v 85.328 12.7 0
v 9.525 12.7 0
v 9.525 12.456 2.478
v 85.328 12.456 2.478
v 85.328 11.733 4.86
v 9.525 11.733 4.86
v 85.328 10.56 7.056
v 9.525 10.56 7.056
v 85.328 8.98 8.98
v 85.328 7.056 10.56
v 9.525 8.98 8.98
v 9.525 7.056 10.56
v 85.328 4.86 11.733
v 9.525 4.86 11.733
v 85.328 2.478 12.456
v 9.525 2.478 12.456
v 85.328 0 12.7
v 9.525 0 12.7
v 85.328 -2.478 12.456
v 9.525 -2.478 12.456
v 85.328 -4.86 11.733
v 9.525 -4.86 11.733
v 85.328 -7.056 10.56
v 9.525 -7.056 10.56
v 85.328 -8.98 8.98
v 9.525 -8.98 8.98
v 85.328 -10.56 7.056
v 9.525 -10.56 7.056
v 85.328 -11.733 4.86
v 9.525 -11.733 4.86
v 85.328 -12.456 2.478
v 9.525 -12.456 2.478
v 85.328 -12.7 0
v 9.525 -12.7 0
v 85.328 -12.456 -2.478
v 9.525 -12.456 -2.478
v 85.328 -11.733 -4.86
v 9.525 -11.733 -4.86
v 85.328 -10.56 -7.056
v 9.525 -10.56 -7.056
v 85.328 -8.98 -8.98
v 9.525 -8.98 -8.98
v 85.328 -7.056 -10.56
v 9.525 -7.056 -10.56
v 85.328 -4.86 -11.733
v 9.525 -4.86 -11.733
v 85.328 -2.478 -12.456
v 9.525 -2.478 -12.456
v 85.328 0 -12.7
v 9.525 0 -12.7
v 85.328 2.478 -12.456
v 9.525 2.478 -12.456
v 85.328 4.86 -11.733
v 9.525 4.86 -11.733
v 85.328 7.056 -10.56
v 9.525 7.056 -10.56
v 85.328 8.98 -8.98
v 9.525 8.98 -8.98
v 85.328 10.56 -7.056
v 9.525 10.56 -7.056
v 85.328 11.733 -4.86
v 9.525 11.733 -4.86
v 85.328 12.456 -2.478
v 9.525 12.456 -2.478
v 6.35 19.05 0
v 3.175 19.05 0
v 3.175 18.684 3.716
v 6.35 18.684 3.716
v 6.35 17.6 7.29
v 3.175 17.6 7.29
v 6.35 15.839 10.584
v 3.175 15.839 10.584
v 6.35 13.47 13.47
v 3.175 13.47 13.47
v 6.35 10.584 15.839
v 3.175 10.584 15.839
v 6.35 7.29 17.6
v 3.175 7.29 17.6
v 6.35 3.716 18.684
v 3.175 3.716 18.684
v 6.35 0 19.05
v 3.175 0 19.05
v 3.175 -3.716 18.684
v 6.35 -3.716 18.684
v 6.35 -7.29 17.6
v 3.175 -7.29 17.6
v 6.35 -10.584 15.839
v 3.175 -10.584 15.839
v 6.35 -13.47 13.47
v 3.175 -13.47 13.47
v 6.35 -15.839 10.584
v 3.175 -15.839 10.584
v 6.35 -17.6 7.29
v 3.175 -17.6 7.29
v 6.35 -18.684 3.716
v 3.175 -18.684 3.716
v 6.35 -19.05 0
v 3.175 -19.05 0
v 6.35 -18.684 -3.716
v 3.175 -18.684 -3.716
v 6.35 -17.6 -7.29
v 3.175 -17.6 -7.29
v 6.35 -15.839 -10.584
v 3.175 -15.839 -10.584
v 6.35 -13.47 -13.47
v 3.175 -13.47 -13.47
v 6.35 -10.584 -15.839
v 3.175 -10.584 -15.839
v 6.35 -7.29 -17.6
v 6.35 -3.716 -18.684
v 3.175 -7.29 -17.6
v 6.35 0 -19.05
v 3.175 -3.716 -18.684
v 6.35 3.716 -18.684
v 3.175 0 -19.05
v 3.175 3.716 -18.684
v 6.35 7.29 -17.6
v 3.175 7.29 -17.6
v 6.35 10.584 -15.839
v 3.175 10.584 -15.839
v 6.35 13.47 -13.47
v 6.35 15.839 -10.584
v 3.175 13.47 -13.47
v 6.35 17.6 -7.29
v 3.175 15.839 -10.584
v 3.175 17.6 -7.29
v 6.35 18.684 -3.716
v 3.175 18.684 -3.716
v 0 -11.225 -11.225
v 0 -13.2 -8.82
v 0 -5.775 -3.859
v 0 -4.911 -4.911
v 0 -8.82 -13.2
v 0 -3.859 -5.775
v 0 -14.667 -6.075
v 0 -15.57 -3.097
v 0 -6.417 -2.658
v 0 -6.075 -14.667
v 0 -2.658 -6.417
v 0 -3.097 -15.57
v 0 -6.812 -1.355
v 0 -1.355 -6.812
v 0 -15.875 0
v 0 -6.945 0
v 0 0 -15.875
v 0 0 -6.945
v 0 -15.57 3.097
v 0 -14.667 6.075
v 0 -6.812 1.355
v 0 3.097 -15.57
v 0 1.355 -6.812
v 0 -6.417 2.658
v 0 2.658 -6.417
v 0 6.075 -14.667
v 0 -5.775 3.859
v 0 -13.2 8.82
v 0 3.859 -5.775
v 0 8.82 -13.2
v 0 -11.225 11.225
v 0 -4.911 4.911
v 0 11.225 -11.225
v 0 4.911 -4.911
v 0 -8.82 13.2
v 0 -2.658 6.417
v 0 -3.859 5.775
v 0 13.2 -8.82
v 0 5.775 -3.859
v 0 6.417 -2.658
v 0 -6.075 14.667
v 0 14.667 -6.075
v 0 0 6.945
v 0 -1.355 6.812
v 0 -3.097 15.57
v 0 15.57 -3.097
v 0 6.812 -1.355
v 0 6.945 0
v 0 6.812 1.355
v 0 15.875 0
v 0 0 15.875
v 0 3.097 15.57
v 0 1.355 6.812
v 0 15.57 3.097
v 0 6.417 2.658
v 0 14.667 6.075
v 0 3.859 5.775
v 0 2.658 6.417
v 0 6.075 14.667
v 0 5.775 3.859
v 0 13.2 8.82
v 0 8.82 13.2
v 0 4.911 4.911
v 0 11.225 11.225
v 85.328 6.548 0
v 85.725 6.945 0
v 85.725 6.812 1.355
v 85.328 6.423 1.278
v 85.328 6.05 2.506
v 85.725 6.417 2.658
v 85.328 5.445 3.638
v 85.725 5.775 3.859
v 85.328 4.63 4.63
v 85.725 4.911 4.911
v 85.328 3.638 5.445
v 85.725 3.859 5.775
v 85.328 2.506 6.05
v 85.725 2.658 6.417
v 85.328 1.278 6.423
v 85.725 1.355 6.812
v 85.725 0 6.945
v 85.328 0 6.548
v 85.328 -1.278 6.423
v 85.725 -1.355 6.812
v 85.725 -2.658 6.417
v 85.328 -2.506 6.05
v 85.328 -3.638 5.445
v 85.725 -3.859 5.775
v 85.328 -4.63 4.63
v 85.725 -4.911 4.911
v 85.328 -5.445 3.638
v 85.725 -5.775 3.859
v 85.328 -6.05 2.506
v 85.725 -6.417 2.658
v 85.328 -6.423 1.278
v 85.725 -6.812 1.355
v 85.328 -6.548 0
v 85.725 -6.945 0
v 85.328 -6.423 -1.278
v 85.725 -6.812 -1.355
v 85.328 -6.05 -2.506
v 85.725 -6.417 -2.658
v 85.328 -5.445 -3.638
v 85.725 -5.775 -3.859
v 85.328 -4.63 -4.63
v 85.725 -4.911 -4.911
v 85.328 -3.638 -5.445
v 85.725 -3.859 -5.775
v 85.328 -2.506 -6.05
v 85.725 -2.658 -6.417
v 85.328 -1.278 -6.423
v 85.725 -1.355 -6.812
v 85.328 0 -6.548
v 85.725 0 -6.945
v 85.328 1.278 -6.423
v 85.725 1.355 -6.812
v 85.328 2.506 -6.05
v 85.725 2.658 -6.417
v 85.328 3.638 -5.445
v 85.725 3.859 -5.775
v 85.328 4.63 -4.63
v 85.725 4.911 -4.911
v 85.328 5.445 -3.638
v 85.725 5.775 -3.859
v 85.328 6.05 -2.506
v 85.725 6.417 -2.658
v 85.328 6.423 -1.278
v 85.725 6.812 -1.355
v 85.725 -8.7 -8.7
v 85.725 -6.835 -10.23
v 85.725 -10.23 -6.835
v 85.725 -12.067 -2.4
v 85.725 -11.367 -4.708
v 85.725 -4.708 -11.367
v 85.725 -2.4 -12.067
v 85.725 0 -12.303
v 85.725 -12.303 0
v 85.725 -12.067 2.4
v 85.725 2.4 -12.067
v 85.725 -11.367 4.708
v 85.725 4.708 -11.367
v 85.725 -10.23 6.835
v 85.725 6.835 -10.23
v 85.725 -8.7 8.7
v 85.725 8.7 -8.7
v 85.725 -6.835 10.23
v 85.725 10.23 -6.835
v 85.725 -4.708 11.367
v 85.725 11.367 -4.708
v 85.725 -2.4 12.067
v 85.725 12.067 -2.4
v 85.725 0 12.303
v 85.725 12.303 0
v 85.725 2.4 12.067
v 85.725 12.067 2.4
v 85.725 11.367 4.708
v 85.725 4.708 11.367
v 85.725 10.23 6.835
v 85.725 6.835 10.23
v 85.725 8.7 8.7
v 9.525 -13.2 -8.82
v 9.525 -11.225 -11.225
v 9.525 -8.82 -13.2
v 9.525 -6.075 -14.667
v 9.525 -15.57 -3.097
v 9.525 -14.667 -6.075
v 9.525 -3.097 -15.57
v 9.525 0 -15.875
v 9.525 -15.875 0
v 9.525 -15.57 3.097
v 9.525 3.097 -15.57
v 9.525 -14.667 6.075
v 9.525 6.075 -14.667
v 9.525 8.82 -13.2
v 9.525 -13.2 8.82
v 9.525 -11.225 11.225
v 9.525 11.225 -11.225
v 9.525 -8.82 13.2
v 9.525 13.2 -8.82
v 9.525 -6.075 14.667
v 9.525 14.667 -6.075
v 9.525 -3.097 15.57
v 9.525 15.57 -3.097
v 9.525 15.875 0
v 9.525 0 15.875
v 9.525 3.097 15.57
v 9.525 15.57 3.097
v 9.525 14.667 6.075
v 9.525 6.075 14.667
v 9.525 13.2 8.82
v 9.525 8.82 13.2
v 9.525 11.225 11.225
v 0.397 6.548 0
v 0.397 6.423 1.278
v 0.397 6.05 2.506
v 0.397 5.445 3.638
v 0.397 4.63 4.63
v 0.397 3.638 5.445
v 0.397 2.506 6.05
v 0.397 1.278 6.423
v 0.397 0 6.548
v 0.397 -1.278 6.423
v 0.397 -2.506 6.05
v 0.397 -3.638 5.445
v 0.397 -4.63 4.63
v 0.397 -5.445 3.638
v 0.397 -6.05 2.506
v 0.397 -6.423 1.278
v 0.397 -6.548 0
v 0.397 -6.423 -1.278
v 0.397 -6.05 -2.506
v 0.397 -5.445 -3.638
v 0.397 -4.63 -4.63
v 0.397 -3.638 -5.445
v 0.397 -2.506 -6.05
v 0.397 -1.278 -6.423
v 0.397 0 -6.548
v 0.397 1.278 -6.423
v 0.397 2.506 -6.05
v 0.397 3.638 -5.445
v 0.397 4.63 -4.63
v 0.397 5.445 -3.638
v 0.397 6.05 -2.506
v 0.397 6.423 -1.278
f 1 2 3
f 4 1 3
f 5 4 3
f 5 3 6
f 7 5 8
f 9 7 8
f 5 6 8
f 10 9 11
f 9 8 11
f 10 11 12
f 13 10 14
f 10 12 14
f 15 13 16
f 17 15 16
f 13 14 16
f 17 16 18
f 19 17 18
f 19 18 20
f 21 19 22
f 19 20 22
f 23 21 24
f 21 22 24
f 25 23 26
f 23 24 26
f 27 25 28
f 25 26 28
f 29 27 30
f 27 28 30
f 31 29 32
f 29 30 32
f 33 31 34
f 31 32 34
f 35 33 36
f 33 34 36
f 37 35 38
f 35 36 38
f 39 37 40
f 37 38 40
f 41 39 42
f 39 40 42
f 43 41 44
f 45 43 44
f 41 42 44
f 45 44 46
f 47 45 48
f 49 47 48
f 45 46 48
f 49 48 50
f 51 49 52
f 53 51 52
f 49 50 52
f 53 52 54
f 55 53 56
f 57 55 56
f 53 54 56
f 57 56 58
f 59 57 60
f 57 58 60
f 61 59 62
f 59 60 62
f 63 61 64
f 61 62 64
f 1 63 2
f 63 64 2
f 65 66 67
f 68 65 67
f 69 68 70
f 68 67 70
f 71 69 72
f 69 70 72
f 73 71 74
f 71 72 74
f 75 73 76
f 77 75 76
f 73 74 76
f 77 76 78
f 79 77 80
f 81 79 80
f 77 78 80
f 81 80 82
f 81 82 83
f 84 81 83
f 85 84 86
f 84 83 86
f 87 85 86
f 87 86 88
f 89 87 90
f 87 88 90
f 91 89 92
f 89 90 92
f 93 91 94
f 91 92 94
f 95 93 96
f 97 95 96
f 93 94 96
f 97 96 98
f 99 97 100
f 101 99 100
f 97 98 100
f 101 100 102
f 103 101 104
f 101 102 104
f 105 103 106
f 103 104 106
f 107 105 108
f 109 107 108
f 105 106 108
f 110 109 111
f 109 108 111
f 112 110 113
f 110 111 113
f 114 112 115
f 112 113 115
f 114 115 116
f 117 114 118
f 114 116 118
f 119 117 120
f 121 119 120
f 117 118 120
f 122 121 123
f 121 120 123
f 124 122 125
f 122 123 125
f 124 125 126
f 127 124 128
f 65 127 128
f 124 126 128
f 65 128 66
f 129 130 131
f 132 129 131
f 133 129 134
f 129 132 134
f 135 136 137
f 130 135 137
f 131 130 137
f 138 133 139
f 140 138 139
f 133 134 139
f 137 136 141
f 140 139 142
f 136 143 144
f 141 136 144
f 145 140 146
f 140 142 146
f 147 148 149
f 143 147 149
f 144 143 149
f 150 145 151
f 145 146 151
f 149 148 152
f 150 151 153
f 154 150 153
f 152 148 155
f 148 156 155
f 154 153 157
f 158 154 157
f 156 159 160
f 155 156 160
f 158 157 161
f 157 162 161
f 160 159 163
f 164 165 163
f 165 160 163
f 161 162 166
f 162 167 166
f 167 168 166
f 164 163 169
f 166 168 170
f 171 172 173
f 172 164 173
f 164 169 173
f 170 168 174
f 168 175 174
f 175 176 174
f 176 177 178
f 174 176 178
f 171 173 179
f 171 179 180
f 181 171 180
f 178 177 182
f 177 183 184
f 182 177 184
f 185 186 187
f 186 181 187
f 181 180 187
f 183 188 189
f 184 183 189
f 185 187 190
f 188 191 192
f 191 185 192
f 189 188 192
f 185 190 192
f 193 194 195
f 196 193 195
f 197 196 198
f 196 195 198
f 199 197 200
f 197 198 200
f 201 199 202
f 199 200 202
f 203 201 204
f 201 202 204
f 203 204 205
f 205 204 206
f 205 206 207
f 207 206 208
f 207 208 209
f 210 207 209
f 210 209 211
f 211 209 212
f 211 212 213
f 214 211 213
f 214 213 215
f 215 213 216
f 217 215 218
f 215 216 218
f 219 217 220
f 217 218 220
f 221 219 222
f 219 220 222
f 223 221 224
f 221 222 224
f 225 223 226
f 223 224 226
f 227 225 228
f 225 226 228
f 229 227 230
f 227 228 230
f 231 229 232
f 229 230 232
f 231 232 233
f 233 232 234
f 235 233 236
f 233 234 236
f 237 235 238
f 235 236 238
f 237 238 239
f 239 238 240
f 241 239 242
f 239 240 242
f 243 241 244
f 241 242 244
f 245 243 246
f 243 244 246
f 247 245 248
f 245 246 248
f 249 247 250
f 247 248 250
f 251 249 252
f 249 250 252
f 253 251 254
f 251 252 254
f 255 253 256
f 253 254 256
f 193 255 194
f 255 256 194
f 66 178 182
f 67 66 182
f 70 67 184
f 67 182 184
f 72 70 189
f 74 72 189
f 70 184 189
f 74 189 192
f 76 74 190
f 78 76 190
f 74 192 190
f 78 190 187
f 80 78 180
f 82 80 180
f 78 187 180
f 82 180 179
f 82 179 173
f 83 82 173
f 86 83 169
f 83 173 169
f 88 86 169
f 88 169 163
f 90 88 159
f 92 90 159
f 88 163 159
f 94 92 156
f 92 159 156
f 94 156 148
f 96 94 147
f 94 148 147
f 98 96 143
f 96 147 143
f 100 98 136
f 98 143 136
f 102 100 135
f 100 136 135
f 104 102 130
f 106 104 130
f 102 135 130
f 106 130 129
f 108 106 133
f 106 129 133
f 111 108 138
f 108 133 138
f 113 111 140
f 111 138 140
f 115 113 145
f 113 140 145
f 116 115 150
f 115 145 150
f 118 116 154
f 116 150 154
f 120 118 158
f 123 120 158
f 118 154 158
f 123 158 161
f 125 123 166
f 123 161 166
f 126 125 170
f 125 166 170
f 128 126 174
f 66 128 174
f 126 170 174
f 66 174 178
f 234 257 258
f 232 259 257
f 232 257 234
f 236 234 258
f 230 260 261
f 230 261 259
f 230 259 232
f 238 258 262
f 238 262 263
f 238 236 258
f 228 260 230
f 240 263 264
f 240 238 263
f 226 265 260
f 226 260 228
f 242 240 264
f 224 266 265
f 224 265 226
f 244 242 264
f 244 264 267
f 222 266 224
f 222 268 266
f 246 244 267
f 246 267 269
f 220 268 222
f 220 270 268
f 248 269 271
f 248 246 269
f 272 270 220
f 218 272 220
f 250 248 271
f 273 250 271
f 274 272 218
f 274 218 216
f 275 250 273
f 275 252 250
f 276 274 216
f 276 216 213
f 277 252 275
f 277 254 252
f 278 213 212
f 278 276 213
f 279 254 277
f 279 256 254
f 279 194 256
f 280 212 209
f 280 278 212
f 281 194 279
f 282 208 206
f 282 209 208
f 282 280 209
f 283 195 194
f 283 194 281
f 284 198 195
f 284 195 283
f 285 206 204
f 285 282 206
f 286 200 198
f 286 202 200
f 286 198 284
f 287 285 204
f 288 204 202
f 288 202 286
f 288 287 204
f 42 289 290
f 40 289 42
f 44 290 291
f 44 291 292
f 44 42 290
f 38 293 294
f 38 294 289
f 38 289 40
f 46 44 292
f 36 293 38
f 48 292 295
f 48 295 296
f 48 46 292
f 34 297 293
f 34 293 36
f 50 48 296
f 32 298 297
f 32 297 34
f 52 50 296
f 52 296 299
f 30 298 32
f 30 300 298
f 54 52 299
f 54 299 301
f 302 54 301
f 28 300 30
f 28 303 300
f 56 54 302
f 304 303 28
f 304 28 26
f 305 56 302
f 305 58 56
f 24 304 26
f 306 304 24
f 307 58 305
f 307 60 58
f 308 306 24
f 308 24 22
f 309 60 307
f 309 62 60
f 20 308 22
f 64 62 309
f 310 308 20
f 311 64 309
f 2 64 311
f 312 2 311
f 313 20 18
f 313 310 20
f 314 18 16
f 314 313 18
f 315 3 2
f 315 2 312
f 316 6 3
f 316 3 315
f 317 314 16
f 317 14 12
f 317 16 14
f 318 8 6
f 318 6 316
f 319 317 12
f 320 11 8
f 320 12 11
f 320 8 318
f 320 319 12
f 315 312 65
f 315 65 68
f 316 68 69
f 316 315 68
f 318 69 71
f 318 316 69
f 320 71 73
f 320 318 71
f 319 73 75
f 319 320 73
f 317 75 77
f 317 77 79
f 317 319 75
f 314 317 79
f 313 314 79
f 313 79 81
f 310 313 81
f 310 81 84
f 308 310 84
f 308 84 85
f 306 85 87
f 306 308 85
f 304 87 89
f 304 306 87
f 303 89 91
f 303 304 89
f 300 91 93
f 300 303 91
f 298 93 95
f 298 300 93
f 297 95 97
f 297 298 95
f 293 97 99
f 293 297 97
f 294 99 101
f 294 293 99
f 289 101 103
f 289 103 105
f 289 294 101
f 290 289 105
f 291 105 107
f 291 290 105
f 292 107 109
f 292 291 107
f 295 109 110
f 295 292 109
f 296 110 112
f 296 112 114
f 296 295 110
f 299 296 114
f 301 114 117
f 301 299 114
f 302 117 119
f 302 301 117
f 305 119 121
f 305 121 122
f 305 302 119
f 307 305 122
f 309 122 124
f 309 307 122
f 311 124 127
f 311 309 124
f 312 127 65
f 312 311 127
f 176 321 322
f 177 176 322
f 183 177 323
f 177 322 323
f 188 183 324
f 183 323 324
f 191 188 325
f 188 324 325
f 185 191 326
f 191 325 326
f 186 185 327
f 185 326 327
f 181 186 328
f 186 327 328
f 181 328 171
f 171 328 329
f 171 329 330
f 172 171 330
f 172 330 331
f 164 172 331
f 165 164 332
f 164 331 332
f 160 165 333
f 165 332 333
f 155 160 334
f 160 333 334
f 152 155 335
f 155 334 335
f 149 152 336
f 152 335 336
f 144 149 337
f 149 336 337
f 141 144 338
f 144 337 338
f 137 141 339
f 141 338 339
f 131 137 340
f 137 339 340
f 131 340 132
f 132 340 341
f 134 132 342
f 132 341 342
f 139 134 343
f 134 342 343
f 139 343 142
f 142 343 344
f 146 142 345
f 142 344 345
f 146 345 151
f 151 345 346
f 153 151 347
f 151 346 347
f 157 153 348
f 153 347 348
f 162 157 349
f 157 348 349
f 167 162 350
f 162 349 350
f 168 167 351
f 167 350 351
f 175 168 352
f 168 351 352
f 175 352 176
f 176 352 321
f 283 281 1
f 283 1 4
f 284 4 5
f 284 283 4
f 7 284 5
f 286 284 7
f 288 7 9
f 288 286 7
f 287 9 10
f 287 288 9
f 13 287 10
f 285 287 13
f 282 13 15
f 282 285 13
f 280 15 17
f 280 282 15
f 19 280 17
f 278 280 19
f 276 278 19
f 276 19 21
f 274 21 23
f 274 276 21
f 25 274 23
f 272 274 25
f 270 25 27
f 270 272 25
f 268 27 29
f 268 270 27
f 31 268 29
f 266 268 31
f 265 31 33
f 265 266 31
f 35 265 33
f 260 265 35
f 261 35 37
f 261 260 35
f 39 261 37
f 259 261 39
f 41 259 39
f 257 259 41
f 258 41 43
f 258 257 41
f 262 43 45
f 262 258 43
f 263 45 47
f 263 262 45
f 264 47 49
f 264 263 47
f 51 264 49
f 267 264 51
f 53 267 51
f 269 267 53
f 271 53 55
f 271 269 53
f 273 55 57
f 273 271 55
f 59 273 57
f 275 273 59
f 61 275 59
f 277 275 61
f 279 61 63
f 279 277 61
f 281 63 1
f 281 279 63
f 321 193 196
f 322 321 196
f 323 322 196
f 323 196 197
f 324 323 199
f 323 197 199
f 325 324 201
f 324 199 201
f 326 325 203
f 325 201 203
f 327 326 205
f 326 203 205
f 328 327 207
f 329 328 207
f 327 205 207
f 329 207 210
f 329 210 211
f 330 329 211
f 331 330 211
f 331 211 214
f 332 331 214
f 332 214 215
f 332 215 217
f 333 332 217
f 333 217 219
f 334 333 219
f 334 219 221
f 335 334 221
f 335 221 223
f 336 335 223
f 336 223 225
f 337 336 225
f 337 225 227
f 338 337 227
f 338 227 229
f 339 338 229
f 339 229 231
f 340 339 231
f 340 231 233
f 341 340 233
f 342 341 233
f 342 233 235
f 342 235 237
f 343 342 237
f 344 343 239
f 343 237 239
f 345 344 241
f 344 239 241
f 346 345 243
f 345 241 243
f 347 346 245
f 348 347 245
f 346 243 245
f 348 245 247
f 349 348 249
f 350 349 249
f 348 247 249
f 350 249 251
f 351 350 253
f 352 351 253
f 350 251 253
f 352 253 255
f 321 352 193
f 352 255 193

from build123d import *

# Parameters (mm, degrees)
F0_R     = 19.05
F1_DEPTH = 9.525
F2_SIZE  = 3.175
F3_R     = 12.7
F4_DEPTH = 76.2
F5_R     = 6.548438
F6_DEPTH = 85.726
F7_SIZE  = 0.396875


with BuildPart() as f1:
    # F0 (on Right) → F1 (new body)
    with BuildSketch(Plane.YZ):
        Circle(F0_R)
    extrude(amount=F1_DEPTH)

    # F2
    f2_edges = [f1.edges().sort_by_distance(p)[0] for p in [
        (9.525, -19.05, 0),
        (0, -19.05, 0),
    ]]
    chamfer(f2_edges, length=F2_SIZE)

    # F3 (on face) → F4 (join)
    with BuildSketch(Plane.YZ.offset(9.525)):
        Circle(F3_R)
    extrude(amount=F4_DEPTH)

    # F5 (on face) → F6 (cut, through all)
    with BuildSketch(Plane.YZ.offset(85.725)):
        Circle(F5_R)
    extrude(amount=-F6_DEPTH, mode=Mode.SUBTRACT)

    # F7
    f7_edges = [f1.edges().sort_by_distance(p)[0] for p in [
        (85.725, -12.7, 0),
        (85.725, -6.548438, 0),
        (0, -6.548438, 0),
    ]]
    chamfer(f7_edges, length=F7_SIZE)


solid = f1.part
